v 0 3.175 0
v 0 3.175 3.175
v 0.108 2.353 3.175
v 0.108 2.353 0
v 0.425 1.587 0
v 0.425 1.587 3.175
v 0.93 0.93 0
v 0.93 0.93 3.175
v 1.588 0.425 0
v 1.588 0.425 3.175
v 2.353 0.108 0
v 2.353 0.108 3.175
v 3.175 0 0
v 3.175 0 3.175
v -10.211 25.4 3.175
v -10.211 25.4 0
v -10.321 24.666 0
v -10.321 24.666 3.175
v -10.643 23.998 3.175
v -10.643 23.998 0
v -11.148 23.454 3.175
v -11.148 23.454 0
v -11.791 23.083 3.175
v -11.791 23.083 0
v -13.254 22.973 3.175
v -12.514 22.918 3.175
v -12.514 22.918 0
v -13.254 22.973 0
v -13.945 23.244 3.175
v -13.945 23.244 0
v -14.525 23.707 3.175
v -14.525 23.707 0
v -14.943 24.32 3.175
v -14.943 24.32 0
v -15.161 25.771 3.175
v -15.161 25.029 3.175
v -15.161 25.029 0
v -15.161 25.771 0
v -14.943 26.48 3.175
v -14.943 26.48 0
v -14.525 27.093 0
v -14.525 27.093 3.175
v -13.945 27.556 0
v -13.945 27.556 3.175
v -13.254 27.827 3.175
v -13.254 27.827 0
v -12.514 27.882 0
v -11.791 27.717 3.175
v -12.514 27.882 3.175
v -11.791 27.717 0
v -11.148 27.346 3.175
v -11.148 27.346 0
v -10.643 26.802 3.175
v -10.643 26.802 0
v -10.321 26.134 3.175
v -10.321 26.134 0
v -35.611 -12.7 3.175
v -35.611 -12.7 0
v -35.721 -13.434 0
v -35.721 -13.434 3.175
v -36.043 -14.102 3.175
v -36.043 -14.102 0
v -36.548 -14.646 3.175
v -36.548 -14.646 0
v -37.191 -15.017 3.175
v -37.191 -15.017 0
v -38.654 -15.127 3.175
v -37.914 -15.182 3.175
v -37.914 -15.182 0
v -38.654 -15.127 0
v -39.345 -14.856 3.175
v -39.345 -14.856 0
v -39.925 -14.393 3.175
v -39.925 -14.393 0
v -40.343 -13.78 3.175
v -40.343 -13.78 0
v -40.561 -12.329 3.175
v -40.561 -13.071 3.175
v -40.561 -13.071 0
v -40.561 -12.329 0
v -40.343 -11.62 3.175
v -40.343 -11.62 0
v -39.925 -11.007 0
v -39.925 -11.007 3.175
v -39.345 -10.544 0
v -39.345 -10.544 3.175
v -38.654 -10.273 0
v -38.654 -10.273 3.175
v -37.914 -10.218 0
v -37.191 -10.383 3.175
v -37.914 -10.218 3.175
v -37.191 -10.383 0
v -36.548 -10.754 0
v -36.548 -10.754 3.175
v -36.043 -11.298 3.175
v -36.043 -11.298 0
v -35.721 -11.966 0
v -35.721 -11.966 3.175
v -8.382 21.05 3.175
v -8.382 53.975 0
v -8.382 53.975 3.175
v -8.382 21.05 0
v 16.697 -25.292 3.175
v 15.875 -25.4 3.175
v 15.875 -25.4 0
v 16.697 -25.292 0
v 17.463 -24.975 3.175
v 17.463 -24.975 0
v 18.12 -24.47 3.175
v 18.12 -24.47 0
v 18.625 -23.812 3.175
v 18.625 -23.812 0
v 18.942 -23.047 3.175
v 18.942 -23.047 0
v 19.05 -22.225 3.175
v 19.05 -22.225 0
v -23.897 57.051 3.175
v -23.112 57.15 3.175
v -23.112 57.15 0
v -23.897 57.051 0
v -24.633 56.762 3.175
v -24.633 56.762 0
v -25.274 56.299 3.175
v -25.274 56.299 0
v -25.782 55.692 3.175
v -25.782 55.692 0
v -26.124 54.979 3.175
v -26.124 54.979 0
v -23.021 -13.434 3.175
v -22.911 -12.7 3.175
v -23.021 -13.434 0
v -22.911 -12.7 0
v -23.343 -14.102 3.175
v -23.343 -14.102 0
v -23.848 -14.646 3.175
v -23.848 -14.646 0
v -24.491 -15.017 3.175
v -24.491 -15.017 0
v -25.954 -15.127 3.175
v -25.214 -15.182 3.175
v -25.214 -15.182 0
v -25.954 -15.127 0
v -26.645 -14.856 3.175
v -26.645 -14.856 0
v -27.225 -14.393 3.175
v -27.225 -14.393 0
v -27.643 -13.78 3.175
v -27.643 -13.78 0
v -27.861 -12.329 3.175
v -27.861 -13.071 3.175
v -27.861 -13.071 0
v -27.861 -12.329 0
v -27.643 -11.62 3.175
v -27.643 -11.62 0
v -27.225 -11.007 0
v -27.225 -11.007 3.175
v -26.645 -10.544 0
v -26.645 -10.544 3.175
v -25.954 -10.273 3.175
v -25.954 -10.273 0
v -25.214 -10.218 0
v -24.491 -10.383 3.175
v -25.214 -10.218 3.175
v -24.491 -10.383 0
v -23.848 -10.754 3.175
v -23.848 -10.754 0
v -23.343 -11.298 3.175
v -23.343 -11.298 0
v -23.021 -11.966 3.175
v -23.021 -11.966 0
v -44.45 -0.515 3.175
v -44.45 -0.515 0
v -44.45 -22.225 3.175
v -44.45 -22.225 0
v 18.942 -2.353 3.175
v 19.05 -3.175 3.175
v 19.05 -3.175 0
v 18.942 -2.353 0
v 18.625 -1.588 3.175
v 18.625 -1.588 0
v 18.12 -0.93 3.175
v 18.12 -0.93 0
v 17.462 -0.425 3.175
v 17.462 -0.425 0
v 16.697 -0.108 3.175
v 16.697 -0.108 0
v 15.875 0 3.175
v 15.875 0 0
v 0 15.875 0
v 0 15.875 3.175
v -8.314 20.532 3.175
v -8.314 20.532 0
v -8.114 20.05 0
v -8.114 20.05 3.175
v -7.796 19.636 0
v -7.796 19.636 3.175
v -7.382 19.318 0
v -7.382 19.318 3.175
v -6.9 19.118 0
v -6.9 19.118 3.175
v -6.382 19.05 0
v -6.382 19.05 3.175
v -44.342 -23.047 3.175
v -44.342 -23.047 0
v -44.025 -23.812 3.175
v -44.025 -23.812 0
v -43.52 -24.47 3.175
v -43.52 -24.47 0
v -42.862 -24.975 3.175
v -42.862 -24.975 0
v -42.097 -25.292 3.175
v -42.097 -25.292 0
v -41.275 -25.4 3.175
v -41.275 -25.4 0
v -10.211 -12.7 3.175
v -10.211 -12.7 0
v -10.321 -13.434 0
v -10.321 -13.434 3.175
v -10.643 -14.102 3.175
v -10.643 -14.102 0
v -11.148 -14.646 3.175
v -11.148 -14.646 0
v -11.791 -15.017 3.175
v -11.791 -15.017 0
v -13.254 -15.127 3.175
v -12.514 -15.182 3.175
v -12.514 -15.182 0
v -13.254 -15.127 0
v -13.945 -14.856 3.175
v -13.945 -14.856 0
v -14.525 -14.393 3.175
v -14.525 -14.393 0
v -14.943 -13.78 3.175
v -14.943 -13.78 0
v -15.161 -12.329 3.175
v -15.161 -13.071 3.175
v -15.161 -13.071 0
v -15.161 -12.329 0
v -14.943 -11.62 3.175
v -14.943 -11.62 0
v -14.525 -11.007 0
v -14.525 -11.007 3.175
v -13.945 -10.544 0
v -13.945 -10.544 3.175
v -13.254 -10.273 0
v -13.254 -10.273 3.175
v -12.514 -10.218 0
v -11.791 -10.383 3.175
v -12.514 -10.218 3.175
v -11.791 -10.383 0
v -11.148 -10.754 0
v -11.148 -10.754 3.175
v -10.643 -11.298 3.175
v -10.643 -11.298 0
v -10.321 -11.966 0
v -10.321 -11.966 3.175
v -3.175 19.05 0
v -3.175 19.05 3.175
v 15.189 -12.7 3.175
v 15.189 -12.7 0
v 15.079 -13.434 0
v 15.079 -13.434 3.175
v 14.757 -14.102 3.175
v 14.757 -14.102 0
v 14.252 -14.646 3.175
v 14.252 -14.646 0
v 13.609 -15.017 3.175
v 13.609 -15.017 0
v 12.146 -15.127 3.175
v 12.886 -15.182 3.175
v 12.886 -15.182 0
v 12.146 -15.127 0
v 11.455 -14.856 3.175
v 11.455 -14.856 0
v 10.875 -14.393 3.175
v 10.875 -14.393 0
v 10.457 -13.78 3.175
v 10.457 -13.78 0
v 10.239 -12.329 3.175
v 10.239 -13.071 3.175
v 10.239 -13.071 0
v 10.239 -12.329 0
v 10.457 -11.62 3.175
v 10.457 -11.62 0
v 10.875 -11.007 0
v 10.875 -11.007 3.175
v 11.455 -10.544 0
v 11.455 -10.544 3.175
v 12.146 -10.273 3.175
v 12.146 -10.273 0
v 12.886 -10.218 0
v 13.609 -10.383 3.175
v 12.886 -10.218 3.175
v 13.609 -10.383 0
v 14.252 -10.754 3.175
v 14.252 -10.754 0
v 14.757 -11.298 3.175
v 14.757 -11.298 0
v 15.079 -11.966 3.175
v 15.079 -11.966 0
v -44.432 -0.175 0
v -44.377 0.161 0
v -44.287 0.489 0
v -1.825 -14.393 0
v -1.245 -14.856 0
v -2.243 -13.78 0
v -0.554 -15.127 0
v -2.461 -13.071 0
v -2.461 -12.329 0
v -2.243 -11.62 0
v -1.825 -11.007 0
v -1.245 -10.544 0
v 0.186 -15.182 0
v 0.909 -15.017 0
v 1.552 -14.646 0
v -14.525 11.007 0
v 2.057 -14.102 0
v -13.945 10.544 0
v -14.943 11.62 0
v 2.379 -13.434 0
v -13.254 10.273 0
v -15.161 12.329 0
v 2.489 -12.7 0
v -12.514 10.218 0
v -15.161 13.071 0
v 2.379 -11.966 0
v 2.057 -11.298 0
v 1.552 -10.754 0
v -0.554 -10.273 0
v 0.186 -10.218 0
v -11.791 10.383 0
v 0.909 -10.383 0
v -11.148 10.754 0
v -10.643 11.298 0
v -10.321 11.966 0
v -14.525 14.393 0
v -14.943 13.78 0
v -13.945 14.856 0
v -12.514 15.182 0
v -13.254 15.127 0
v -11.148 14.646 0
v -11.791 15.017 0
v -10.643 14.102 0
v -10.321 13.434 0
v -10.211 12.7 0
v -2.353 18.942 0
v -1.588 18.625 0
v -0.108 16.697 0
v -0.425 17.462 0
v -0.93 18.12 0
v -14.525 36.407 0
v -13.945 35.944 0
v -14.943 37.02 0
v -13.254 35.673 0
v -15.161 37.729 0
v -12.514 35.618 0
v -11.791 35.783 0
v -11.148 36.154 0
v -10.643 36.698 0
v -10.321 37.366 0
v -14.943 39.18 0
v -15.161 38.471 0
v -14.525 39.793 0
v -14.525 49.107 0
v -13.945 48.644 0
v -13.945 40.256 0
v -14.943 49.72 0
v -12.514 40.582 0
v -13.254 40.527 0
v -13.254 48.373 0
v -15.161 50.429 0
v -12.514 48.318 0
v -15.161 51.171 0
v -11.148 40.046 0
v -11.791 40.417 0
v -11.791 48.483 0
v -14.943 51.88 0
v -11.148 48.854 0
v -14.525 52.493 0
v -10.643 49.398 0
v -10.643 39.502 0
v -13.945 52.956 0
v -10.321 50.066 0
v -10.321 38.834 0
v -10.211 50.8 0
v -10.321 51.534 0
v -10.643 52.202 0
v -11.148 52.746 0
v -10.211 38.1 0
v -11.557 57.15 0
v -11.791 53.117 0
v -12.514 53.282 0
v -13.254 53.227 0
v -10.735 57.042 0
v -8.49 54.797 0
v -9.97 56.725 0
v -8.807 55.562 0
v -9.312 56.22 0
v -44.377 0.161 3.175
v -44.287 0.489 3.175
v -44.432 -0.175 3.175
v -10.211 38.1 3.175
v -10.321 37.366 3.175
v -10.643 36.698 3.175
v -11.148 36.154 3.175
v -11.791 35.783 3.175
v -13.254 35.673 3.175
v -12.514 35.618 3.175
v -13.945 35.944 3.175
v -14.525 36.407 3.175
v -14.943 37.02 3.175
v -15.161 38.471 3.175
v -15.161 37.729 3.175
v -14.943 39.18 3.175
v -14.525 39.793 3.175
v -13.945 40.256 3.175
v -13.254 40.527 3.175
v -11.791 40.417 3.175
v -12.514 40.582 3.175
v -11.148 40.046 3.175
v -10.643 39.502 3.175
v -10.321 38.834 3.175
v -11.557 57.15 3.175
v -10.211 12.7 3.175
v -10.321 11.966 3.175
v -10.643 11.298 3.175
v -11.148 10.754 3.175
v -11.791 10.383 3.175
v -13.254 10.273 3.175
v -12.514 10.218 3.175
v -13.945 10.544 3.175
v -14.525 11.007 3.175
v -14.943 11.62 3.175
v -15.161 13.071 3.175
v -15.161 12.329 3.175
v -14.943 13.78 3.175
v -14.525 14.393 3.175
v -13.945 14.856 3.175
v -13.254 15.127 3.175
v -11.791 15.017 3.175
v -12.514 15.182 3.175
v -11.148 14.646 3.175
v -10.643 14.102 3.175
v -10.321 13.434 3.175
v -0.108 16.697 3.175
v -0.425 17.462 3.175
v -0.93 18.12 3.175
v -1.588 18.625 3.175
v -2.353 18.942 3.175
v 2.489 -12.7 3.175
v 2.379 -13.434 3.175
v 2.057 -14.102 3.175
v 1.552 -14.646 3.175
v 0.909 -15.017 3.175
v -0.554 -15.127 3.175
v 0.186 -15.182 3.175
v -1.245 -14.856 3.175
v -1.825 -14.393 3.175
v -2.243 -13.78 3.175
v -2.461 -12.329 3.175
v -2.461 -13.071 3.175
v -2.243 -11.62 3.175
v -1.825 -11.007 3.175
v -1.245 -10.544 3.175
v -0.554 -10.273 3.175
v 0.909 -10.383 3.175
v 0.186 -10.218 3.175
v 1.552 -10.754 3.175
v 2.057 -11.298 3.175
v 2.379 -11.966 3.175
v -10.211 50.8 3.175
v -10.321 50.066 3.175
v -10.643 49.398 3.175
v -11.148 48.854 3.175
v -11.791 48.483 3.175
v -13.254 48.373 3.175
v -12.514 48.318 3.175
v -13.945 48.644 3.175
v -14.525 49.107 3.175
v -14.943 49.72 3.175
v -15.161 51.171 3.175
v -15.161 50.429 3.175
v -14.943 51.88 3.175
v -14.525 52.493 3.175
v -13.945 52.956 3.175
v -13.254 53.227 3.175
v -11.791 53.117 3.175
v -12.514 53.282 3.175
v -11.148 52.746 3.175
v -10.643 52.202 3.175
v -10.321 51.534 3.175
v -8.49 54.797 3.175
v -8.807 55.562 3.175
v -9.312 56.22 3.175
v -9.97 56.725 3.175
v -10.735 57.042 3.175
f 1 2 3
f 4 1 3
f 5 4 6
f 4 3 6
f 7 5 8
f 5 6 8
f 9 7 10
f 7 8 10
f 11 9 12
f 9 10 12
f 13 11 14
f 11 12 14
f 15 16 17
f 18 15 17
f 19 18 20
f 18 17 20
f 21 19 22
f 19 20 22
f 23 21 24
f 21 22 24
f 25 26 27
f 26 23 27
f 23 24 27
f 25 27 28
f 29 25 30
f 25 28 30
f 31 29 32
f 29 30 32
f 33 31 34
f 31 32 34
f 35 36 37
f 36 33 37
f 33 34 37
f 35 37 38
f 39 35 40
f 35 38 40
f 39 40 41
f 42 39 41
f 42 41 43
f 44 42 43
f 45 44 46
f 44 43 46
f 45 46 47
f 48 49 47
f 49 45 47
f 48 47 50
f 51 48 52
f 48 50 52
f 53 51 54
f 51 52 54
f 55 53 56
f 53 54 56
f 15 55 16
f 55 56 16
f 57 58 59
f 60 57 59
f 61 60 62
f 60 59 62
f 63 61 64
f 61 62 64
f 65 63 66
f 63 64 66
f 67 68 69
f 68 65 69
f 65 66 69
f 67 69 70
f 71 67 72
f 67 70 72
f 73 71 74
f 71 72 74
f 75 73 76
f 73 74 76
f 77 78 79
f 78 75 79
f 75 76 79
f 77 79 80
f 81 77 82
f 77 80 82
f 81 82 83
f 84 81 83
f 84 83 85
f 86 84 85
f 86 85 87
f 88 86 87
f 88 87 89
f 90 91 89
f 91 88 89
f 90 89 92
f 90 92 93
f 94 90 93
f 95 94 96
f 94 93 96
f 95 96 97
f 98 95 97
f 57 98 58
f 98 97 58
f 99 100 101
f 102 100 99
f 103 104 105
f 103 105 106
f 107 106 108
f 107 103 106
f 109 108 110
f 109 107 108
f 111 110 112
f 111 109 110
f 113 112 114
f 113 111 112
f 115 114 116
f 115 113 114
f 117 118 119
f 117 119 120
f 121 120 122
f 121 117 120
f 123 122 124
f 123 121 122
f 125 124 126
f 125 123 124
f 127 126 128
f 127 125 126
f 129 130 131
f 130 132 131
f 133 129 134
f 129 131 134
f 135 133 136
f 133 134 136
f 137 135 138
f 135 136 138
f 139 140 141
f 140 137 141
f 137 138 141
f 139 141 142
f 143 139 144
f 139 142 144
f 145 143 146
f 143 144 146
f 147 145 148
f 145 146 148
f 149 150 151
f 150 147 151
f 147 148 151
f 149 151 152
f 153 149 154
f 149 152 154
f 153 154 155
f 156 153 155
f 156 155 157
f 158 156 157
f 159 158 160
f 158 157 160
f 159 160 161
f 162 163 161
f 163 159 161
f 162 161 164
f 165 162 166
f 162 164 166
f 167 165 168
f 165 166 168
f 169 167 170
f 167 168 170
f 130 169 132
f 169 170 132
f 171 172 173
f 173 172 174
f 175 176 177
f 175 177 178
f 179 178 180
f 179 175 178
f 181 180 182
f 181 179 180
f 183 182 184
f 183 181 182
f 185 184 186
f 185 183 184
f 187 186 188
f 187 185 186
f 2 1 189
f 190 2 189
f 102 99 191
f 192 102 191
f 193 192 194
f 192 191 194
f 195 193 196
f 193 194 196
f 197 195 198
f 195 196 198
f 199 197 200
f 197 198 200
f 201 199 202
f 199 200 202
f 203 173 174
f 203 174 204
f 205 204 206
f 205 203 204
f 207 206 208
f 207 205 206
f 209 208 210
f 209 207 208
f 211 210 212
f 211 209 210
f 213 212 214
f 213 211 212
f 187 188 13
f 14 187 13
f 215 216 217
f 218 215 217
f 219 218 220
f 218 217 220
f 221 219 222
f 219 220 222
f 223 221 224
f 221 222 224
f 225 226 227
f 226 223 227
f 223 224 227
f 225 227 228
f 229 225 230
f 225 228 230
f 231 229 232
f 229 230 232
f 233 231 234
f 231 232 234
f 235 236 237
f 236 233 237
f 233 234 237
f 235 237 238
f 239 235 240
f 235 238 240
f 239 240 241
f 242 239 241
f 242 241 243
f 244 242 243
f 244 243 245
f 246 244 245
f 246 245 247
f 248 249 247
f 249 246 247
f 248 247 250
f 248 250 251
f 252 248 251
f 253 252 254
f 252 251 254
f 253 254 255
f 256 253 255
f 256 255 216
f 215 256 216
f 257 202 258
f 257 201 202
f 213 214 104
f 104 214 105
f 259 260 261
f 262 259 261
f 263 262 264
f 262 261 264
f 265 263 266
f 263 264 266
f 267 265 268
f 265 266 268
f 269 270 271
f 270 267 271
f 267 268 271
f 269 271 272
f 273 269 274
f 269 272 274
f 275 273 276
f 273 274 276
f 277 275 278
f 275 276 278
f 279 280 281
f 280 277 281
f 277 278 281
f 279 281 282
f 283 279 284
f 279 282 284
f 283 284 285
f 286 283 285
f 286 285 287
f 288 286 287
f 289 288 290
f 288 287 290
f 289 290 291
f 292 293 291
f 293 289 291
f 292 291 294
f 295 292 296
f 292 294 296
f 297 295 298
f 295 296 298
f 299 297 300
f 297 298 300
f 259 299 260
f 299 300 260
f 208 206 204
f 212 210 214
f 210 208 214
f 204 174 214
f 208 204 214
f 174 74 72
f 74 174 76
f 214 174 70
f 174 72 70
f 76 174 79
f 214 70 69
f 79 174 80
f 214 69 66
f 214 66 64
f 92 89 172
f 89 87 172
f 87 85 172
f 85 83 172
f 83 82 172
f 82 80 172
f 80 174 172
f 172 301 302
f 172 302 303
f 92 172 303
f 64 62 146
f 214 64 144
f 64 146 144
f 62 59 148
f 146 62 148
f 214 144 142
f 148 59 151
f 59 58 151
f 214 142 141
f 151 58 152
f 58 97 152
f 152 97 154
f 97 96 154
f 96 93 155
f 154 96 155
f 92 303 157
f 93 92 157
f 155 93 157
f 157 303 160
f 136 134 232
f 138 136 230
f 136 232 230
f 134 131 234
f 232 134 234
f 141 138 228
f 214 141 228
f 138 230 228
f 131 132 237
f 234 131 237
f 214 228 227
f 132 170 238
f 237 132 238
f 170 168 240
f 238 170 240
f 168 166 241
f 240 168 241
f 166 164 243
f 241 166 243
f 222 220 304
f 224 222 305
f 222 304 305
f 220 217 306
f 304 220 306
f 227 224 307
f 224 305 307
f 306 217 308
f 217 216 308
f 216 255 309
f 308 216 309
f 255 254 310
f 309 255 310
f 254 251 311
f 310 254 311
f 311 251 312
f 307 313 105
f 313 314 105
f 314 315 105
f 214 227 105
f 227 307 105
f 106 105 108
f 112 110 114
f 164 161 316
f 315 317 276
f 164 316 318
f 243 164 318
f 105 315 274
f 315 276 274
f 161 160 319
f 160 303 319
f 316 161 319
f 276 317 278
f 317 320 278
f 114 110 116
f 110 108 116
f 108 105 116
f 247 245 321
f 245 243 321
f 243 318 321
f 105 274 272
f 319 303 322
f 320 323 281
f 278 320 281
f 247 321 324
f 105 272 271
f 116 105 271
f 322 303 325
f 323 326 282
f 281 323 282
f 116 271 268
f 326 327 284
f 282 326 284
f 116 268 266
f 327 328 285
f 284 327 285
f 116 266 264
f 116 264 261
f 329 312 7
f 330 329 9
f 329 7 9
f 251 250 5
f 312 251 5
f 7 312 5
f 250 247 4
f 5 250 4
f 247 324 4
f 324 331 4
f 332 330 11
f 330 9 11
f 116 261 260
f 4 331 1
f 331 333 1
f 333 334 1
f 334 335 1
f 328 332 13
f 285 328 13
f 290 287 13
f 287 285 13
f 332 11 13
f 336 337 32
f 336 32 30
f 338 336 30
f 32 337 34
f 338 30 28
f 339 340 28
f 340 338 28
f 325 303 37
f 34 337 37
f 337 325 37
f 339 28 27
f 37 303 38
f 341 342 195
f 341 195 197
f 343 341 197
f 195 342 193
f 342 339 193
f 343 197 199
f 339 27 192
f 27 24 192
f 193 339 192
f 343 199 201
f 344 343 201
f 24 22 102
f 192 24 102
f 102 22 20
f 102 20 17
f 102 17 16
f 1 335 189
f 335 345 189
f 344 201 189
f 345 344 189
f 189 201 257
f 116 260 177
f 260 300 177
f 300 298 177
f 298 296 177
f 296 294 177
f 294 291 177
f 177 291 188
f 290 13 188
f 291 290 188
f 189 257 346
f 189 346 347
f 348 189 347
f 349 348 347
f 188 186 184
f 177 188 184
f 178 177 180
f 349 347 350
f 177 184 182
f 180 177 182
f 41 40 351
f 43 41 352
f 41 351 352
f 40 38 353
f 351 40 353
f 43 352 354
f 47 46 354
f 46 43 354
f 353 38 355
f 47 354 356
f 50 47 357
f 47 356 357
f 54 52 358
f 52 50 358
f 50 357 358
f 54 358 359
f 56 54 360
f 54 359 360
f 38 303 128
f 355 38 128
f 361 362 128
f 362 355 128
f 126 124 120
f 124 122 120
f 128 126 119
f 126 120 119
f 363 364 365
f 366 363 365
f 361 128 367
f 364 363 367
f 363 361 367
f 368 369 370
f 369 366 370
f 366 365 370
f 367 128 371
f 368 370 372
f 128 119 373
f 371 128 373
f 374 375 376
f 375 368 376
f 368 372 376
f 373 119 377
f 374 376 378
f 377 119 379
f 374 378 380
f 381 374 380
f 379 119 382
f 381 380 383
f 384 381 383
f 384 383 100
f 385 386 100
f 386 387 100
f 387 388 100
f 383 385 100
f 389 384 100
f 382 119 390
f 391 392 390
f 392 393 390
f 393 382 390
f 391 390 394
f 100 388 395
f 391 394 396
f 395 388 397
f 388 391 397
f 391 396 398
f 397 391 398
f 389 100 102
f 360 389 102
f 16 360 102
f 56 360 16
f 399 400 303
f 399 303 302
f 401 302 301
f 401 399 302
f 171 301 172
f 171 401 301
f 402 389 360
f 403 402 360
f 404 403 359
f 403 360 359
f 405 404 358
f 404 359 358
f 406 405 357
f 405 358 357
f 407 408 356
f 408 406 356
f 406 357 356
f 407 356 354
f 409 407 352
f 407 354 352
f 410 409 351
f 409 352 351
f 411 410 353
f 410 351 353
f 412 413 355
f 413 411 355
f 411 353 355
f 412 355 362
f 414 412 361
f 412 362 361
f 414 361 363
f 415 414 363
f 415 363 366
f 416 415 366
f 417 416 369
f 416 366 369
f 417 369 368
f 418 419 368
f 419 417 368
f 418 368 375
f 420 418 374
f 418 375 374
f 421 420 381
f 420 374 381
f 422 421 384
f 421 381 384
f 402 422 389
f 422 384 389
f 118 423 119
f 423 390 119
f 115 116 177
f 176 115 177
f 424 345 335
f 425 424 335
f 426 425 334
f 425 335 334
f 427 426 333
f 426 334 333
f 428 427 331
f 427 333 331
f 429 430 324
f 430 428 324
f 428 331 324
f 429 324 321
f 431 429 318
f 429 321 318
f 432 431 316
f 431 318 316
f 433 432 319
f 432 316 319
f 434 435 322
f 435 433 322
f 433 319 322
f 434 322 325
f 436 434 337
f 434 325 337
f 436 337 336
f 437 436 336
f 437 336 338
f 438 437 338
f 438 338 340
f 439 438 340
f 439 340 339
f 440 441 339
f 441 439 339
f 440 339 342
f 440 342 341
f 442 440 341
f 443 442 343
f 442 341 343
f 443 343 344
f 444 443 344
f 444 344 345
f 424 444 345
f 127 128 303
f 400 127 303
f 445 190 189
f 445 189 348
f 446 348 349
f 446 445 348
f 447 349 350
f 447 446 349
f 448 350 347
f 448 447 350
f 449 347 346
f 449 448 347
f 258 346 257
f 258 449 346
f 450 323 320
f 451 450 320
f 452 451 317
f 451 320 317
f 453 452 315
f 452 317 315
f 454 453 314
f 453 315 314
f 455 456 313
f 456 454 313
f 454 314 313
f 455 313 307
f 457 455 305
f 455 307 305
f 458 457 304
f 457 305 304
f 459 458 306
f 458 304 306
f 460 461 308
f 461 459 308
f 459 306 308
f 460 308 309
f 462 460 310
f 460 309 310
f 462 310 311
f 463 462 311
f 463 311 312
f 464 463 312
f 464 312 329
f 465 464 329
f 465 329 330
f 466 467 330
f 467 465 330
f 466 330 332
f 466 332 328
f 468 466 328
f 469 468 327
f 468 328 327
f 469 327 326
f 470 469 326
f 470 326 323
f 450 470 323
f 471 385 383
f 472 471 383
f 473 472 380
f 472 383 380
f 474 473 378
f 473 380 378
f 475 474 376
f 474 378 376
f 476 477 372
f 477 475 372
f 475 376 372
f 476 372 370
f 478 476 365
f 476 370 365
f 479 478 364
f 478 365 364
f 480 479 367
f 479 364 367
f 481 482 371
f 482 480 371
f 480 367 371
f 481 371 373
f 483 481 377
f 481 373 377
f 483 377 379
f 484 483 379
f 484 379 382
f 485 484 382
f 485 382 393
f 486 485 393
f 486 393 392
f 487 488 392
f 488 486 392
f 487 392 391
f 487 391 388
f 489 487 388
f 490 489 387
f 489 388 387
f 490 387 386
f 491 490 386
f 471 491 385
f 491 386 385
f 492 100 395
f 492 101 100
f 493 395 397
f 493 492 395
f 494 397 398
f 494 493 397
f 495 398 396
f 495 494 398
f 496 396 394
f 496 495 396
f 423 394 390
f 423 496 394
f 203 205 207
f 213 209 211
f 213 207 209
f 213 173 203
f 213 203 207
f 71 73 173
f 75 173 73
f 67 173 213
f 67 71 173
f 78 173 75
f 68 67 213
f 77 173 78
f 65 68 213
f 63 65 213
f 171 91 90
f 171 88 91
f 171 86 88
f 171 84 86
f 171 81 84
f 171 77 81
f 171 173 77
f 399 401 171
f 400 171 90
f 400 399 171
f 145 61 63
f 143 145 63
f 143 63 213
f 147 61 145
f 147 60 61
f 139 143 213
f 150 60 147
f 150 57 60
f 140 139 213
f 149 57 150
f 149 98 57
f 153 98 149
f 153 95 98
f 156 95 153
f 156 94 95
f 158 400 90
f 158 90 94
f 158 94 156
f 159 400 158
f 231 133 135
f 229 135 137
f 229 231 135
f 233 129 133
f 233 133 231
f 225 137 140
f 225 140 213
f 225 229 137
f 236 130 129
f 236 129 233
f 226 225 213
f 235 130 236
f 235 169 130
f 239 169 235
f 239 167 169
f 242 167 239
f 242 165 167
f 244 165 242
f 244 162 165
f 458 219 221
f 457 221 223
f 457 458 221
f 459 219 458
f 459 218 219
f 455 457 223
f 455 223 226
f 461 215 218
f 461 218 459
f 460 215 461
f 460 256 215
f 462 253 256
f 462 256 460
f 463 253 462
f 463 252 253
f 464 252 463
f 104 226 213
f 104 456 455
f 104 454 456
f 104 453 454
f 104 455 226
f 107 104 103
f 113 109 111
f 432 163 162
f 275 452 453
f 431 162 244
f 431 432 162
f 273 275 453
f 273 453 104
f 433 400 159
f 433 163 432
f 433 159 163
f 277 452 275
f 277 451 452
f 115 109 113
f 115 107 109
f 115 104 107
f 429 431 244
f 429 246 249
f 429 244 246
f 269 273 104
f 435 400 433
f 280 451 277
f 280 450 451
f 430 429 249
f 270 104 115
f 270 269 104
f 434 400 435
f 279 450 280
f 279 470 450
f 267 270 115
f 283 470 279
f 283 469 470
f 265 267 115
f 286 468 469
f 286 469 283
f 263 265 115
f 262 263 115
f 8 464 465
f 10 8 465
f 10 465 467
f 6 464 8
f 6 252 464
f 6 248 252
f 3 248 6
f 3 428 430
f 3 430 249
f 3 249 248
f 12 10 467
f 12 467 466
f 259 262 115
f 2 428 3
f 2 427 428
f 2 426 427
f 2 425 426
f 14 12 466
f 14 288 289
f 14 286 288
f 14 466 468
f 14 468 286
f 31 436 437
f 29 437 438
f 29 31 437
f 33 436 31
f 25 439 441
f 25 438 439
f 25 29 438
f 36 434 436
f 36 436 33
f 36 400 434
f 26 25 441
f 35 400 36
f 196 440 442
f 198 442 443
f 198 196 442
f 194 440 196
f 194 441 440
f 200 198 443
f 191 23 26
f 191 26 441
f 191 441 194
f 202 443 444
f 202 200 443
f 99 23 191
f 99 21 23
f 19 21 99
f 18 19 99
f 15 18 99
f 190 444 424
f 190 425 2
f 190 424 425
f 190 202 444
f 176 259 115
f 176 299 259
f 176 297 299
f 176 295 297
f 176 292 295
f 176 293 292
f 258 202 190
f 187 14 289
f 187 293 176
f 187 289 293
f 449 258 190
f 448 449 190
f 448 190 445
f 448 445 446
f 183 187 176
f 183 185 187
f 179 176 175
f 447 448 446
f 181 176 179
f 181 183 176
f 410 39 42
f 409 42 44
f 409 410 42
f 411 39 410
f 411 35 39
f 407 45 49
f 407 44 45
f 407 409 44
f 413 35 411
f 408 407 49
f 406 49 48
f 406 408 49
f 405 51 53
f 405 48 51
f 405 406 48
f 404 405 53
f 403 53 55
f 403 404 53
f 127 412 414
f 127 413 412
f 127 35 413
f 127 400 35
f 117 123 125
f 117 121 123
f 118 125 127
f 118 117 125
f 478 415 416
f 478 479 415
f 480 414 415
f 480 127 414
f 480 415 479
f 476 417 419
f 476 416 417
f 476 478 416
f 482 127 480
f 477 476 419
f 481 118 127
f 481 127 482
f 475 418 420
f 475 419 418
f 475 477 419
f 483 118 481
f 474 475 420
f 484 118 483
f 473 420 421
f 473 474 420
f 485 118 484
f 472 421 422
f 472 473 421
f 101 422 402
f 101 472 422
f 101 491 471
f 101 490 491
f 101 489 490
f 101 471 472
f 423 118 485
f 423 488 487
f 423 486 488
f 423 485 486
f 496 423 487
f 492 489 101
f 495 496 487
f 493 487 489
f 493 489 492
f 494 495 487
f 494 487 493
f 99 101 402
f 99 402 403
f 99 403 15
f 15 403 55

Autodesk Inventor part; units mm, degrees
ref_plane "YZ Plane" through (0, 0, 0) normal (1, 0, 0) x (0, 1, 0)
ref_plane "XZ Plane" through (0, 0, 0) normal (0, 1, 0) x (-1, 0, 0)
ref_plane "XY Plane" through (0, 0, 0) normal (0, 0, 1) x (1, 0, 0)
sketch "Sketch1" plane through (0, 0, 0) normal (0, 0, 1) x (1, 0, 0)
  circle A0 centre (-12.7, 12.7) radius 2.4892
  line L0 (19.05, 0) -> (-44.45, 0)
  line L1 (-44.45, 0) -> (-44.45, -25.4)
  line L2 (-44.45, -25.4) -> (19.05, -25.4)
  line L3 (19.05, -25.4) -> (19.05, 0)
  line L4 (19.05, 0) -> (-44.45, -25.4) construction
  line L5 (-44.45, 0) -> (19.05, -25.4) construction
  line L6 (0, 57.15) -> (-25.4, 57.15)
  line L7 (-25.4, 57.15) -> (-25.4, 0)
  line L8 (-25.4, 0) -> (0, 0)
  line L9 (0, 0) -> (0, 57.15)
  line L10 (0, 57.15) -> (-25.4, 0) construction
  line L11 (-25.4, 57.15) -> (0, 0) construction
  line L12 (-25.4, 57.15) -> (-44.45, 0)
  circle A1 centre (-12.7, 25.4) radius 2.4892
  circle A2 centre (-12.7, 38.1) radius 2.4892
  circle A3 centre (-12.7, 50.8) radius 2.4892
  circle A4 centre (-38.1, -12.7) radius 2.4892
  circle A5 centre (-25.4, -12.7) radius 2.4892
  circle A6 centre (-12.7, -12.7) radius 2.4892
  circle A7 centre (0, -12.7) radius 2.4892
  circle A8 centre (12.7, -12.7) radius 2.4892
  line L13 (0, 57.15) -> (-8.382, 57.15)
  line L14 (-8.382, 57.15) -> (-8.382, 19.05)
  line L15 (-8.382, 19.05) -> (0, 19.05)
  line L16 (0, 19.05) -> (0, 57.15)
  point P0 (0, 0)
  point P1 (-12.7, -12.7)
  point P2 (-12.7, 28.575)
  point P3 (-12.7, 57.15)
  point P4 (-44.45, -12.7)
  point P5 (0, 19.05)
  dimension "d0" = 4.9784
  dimension "d1" = 25.4
  dimension "d2" = 25.4
  dimension "d5" = 12.7
  dimension "d10" = 6.35
  dimension "d11" = 12.7
  dimension "d12" = 19.05
  dimension "d15" = 12.7
  dimension "d21" = 6.35
  dimension "d25" = 8.382
  dimension "d26" = 6.35
  dimension "d28" = 6.35
extrude "Extrusion1" add sketch "Sketch1" along normal blind 3.175 contours L3 L2 L1 L0 | L0 L7 L6 L14 L15 L9 | L0 L12 L7
fillet "Fillet1" radius 3.175 8 edges at (19.05, 0, 1.5875) (19.05, -25.4, 1.5875) (-44.45, -25.4, 1.5875) (0, 0, 1.5875) (-44.45, 0, 1.5875) (-25.4, 57.15, 1.5875) (-8.382, 57.15, 1.5875) (0, 19.05, 1.5875)
fillet "Fillet1" radius 2 1 edges at (-8.382, 19.05, 1.5875)
equation "\"d28\" = d21"
properties part number "Elevator Mounting Gusset" material "Aluminum 6061"
